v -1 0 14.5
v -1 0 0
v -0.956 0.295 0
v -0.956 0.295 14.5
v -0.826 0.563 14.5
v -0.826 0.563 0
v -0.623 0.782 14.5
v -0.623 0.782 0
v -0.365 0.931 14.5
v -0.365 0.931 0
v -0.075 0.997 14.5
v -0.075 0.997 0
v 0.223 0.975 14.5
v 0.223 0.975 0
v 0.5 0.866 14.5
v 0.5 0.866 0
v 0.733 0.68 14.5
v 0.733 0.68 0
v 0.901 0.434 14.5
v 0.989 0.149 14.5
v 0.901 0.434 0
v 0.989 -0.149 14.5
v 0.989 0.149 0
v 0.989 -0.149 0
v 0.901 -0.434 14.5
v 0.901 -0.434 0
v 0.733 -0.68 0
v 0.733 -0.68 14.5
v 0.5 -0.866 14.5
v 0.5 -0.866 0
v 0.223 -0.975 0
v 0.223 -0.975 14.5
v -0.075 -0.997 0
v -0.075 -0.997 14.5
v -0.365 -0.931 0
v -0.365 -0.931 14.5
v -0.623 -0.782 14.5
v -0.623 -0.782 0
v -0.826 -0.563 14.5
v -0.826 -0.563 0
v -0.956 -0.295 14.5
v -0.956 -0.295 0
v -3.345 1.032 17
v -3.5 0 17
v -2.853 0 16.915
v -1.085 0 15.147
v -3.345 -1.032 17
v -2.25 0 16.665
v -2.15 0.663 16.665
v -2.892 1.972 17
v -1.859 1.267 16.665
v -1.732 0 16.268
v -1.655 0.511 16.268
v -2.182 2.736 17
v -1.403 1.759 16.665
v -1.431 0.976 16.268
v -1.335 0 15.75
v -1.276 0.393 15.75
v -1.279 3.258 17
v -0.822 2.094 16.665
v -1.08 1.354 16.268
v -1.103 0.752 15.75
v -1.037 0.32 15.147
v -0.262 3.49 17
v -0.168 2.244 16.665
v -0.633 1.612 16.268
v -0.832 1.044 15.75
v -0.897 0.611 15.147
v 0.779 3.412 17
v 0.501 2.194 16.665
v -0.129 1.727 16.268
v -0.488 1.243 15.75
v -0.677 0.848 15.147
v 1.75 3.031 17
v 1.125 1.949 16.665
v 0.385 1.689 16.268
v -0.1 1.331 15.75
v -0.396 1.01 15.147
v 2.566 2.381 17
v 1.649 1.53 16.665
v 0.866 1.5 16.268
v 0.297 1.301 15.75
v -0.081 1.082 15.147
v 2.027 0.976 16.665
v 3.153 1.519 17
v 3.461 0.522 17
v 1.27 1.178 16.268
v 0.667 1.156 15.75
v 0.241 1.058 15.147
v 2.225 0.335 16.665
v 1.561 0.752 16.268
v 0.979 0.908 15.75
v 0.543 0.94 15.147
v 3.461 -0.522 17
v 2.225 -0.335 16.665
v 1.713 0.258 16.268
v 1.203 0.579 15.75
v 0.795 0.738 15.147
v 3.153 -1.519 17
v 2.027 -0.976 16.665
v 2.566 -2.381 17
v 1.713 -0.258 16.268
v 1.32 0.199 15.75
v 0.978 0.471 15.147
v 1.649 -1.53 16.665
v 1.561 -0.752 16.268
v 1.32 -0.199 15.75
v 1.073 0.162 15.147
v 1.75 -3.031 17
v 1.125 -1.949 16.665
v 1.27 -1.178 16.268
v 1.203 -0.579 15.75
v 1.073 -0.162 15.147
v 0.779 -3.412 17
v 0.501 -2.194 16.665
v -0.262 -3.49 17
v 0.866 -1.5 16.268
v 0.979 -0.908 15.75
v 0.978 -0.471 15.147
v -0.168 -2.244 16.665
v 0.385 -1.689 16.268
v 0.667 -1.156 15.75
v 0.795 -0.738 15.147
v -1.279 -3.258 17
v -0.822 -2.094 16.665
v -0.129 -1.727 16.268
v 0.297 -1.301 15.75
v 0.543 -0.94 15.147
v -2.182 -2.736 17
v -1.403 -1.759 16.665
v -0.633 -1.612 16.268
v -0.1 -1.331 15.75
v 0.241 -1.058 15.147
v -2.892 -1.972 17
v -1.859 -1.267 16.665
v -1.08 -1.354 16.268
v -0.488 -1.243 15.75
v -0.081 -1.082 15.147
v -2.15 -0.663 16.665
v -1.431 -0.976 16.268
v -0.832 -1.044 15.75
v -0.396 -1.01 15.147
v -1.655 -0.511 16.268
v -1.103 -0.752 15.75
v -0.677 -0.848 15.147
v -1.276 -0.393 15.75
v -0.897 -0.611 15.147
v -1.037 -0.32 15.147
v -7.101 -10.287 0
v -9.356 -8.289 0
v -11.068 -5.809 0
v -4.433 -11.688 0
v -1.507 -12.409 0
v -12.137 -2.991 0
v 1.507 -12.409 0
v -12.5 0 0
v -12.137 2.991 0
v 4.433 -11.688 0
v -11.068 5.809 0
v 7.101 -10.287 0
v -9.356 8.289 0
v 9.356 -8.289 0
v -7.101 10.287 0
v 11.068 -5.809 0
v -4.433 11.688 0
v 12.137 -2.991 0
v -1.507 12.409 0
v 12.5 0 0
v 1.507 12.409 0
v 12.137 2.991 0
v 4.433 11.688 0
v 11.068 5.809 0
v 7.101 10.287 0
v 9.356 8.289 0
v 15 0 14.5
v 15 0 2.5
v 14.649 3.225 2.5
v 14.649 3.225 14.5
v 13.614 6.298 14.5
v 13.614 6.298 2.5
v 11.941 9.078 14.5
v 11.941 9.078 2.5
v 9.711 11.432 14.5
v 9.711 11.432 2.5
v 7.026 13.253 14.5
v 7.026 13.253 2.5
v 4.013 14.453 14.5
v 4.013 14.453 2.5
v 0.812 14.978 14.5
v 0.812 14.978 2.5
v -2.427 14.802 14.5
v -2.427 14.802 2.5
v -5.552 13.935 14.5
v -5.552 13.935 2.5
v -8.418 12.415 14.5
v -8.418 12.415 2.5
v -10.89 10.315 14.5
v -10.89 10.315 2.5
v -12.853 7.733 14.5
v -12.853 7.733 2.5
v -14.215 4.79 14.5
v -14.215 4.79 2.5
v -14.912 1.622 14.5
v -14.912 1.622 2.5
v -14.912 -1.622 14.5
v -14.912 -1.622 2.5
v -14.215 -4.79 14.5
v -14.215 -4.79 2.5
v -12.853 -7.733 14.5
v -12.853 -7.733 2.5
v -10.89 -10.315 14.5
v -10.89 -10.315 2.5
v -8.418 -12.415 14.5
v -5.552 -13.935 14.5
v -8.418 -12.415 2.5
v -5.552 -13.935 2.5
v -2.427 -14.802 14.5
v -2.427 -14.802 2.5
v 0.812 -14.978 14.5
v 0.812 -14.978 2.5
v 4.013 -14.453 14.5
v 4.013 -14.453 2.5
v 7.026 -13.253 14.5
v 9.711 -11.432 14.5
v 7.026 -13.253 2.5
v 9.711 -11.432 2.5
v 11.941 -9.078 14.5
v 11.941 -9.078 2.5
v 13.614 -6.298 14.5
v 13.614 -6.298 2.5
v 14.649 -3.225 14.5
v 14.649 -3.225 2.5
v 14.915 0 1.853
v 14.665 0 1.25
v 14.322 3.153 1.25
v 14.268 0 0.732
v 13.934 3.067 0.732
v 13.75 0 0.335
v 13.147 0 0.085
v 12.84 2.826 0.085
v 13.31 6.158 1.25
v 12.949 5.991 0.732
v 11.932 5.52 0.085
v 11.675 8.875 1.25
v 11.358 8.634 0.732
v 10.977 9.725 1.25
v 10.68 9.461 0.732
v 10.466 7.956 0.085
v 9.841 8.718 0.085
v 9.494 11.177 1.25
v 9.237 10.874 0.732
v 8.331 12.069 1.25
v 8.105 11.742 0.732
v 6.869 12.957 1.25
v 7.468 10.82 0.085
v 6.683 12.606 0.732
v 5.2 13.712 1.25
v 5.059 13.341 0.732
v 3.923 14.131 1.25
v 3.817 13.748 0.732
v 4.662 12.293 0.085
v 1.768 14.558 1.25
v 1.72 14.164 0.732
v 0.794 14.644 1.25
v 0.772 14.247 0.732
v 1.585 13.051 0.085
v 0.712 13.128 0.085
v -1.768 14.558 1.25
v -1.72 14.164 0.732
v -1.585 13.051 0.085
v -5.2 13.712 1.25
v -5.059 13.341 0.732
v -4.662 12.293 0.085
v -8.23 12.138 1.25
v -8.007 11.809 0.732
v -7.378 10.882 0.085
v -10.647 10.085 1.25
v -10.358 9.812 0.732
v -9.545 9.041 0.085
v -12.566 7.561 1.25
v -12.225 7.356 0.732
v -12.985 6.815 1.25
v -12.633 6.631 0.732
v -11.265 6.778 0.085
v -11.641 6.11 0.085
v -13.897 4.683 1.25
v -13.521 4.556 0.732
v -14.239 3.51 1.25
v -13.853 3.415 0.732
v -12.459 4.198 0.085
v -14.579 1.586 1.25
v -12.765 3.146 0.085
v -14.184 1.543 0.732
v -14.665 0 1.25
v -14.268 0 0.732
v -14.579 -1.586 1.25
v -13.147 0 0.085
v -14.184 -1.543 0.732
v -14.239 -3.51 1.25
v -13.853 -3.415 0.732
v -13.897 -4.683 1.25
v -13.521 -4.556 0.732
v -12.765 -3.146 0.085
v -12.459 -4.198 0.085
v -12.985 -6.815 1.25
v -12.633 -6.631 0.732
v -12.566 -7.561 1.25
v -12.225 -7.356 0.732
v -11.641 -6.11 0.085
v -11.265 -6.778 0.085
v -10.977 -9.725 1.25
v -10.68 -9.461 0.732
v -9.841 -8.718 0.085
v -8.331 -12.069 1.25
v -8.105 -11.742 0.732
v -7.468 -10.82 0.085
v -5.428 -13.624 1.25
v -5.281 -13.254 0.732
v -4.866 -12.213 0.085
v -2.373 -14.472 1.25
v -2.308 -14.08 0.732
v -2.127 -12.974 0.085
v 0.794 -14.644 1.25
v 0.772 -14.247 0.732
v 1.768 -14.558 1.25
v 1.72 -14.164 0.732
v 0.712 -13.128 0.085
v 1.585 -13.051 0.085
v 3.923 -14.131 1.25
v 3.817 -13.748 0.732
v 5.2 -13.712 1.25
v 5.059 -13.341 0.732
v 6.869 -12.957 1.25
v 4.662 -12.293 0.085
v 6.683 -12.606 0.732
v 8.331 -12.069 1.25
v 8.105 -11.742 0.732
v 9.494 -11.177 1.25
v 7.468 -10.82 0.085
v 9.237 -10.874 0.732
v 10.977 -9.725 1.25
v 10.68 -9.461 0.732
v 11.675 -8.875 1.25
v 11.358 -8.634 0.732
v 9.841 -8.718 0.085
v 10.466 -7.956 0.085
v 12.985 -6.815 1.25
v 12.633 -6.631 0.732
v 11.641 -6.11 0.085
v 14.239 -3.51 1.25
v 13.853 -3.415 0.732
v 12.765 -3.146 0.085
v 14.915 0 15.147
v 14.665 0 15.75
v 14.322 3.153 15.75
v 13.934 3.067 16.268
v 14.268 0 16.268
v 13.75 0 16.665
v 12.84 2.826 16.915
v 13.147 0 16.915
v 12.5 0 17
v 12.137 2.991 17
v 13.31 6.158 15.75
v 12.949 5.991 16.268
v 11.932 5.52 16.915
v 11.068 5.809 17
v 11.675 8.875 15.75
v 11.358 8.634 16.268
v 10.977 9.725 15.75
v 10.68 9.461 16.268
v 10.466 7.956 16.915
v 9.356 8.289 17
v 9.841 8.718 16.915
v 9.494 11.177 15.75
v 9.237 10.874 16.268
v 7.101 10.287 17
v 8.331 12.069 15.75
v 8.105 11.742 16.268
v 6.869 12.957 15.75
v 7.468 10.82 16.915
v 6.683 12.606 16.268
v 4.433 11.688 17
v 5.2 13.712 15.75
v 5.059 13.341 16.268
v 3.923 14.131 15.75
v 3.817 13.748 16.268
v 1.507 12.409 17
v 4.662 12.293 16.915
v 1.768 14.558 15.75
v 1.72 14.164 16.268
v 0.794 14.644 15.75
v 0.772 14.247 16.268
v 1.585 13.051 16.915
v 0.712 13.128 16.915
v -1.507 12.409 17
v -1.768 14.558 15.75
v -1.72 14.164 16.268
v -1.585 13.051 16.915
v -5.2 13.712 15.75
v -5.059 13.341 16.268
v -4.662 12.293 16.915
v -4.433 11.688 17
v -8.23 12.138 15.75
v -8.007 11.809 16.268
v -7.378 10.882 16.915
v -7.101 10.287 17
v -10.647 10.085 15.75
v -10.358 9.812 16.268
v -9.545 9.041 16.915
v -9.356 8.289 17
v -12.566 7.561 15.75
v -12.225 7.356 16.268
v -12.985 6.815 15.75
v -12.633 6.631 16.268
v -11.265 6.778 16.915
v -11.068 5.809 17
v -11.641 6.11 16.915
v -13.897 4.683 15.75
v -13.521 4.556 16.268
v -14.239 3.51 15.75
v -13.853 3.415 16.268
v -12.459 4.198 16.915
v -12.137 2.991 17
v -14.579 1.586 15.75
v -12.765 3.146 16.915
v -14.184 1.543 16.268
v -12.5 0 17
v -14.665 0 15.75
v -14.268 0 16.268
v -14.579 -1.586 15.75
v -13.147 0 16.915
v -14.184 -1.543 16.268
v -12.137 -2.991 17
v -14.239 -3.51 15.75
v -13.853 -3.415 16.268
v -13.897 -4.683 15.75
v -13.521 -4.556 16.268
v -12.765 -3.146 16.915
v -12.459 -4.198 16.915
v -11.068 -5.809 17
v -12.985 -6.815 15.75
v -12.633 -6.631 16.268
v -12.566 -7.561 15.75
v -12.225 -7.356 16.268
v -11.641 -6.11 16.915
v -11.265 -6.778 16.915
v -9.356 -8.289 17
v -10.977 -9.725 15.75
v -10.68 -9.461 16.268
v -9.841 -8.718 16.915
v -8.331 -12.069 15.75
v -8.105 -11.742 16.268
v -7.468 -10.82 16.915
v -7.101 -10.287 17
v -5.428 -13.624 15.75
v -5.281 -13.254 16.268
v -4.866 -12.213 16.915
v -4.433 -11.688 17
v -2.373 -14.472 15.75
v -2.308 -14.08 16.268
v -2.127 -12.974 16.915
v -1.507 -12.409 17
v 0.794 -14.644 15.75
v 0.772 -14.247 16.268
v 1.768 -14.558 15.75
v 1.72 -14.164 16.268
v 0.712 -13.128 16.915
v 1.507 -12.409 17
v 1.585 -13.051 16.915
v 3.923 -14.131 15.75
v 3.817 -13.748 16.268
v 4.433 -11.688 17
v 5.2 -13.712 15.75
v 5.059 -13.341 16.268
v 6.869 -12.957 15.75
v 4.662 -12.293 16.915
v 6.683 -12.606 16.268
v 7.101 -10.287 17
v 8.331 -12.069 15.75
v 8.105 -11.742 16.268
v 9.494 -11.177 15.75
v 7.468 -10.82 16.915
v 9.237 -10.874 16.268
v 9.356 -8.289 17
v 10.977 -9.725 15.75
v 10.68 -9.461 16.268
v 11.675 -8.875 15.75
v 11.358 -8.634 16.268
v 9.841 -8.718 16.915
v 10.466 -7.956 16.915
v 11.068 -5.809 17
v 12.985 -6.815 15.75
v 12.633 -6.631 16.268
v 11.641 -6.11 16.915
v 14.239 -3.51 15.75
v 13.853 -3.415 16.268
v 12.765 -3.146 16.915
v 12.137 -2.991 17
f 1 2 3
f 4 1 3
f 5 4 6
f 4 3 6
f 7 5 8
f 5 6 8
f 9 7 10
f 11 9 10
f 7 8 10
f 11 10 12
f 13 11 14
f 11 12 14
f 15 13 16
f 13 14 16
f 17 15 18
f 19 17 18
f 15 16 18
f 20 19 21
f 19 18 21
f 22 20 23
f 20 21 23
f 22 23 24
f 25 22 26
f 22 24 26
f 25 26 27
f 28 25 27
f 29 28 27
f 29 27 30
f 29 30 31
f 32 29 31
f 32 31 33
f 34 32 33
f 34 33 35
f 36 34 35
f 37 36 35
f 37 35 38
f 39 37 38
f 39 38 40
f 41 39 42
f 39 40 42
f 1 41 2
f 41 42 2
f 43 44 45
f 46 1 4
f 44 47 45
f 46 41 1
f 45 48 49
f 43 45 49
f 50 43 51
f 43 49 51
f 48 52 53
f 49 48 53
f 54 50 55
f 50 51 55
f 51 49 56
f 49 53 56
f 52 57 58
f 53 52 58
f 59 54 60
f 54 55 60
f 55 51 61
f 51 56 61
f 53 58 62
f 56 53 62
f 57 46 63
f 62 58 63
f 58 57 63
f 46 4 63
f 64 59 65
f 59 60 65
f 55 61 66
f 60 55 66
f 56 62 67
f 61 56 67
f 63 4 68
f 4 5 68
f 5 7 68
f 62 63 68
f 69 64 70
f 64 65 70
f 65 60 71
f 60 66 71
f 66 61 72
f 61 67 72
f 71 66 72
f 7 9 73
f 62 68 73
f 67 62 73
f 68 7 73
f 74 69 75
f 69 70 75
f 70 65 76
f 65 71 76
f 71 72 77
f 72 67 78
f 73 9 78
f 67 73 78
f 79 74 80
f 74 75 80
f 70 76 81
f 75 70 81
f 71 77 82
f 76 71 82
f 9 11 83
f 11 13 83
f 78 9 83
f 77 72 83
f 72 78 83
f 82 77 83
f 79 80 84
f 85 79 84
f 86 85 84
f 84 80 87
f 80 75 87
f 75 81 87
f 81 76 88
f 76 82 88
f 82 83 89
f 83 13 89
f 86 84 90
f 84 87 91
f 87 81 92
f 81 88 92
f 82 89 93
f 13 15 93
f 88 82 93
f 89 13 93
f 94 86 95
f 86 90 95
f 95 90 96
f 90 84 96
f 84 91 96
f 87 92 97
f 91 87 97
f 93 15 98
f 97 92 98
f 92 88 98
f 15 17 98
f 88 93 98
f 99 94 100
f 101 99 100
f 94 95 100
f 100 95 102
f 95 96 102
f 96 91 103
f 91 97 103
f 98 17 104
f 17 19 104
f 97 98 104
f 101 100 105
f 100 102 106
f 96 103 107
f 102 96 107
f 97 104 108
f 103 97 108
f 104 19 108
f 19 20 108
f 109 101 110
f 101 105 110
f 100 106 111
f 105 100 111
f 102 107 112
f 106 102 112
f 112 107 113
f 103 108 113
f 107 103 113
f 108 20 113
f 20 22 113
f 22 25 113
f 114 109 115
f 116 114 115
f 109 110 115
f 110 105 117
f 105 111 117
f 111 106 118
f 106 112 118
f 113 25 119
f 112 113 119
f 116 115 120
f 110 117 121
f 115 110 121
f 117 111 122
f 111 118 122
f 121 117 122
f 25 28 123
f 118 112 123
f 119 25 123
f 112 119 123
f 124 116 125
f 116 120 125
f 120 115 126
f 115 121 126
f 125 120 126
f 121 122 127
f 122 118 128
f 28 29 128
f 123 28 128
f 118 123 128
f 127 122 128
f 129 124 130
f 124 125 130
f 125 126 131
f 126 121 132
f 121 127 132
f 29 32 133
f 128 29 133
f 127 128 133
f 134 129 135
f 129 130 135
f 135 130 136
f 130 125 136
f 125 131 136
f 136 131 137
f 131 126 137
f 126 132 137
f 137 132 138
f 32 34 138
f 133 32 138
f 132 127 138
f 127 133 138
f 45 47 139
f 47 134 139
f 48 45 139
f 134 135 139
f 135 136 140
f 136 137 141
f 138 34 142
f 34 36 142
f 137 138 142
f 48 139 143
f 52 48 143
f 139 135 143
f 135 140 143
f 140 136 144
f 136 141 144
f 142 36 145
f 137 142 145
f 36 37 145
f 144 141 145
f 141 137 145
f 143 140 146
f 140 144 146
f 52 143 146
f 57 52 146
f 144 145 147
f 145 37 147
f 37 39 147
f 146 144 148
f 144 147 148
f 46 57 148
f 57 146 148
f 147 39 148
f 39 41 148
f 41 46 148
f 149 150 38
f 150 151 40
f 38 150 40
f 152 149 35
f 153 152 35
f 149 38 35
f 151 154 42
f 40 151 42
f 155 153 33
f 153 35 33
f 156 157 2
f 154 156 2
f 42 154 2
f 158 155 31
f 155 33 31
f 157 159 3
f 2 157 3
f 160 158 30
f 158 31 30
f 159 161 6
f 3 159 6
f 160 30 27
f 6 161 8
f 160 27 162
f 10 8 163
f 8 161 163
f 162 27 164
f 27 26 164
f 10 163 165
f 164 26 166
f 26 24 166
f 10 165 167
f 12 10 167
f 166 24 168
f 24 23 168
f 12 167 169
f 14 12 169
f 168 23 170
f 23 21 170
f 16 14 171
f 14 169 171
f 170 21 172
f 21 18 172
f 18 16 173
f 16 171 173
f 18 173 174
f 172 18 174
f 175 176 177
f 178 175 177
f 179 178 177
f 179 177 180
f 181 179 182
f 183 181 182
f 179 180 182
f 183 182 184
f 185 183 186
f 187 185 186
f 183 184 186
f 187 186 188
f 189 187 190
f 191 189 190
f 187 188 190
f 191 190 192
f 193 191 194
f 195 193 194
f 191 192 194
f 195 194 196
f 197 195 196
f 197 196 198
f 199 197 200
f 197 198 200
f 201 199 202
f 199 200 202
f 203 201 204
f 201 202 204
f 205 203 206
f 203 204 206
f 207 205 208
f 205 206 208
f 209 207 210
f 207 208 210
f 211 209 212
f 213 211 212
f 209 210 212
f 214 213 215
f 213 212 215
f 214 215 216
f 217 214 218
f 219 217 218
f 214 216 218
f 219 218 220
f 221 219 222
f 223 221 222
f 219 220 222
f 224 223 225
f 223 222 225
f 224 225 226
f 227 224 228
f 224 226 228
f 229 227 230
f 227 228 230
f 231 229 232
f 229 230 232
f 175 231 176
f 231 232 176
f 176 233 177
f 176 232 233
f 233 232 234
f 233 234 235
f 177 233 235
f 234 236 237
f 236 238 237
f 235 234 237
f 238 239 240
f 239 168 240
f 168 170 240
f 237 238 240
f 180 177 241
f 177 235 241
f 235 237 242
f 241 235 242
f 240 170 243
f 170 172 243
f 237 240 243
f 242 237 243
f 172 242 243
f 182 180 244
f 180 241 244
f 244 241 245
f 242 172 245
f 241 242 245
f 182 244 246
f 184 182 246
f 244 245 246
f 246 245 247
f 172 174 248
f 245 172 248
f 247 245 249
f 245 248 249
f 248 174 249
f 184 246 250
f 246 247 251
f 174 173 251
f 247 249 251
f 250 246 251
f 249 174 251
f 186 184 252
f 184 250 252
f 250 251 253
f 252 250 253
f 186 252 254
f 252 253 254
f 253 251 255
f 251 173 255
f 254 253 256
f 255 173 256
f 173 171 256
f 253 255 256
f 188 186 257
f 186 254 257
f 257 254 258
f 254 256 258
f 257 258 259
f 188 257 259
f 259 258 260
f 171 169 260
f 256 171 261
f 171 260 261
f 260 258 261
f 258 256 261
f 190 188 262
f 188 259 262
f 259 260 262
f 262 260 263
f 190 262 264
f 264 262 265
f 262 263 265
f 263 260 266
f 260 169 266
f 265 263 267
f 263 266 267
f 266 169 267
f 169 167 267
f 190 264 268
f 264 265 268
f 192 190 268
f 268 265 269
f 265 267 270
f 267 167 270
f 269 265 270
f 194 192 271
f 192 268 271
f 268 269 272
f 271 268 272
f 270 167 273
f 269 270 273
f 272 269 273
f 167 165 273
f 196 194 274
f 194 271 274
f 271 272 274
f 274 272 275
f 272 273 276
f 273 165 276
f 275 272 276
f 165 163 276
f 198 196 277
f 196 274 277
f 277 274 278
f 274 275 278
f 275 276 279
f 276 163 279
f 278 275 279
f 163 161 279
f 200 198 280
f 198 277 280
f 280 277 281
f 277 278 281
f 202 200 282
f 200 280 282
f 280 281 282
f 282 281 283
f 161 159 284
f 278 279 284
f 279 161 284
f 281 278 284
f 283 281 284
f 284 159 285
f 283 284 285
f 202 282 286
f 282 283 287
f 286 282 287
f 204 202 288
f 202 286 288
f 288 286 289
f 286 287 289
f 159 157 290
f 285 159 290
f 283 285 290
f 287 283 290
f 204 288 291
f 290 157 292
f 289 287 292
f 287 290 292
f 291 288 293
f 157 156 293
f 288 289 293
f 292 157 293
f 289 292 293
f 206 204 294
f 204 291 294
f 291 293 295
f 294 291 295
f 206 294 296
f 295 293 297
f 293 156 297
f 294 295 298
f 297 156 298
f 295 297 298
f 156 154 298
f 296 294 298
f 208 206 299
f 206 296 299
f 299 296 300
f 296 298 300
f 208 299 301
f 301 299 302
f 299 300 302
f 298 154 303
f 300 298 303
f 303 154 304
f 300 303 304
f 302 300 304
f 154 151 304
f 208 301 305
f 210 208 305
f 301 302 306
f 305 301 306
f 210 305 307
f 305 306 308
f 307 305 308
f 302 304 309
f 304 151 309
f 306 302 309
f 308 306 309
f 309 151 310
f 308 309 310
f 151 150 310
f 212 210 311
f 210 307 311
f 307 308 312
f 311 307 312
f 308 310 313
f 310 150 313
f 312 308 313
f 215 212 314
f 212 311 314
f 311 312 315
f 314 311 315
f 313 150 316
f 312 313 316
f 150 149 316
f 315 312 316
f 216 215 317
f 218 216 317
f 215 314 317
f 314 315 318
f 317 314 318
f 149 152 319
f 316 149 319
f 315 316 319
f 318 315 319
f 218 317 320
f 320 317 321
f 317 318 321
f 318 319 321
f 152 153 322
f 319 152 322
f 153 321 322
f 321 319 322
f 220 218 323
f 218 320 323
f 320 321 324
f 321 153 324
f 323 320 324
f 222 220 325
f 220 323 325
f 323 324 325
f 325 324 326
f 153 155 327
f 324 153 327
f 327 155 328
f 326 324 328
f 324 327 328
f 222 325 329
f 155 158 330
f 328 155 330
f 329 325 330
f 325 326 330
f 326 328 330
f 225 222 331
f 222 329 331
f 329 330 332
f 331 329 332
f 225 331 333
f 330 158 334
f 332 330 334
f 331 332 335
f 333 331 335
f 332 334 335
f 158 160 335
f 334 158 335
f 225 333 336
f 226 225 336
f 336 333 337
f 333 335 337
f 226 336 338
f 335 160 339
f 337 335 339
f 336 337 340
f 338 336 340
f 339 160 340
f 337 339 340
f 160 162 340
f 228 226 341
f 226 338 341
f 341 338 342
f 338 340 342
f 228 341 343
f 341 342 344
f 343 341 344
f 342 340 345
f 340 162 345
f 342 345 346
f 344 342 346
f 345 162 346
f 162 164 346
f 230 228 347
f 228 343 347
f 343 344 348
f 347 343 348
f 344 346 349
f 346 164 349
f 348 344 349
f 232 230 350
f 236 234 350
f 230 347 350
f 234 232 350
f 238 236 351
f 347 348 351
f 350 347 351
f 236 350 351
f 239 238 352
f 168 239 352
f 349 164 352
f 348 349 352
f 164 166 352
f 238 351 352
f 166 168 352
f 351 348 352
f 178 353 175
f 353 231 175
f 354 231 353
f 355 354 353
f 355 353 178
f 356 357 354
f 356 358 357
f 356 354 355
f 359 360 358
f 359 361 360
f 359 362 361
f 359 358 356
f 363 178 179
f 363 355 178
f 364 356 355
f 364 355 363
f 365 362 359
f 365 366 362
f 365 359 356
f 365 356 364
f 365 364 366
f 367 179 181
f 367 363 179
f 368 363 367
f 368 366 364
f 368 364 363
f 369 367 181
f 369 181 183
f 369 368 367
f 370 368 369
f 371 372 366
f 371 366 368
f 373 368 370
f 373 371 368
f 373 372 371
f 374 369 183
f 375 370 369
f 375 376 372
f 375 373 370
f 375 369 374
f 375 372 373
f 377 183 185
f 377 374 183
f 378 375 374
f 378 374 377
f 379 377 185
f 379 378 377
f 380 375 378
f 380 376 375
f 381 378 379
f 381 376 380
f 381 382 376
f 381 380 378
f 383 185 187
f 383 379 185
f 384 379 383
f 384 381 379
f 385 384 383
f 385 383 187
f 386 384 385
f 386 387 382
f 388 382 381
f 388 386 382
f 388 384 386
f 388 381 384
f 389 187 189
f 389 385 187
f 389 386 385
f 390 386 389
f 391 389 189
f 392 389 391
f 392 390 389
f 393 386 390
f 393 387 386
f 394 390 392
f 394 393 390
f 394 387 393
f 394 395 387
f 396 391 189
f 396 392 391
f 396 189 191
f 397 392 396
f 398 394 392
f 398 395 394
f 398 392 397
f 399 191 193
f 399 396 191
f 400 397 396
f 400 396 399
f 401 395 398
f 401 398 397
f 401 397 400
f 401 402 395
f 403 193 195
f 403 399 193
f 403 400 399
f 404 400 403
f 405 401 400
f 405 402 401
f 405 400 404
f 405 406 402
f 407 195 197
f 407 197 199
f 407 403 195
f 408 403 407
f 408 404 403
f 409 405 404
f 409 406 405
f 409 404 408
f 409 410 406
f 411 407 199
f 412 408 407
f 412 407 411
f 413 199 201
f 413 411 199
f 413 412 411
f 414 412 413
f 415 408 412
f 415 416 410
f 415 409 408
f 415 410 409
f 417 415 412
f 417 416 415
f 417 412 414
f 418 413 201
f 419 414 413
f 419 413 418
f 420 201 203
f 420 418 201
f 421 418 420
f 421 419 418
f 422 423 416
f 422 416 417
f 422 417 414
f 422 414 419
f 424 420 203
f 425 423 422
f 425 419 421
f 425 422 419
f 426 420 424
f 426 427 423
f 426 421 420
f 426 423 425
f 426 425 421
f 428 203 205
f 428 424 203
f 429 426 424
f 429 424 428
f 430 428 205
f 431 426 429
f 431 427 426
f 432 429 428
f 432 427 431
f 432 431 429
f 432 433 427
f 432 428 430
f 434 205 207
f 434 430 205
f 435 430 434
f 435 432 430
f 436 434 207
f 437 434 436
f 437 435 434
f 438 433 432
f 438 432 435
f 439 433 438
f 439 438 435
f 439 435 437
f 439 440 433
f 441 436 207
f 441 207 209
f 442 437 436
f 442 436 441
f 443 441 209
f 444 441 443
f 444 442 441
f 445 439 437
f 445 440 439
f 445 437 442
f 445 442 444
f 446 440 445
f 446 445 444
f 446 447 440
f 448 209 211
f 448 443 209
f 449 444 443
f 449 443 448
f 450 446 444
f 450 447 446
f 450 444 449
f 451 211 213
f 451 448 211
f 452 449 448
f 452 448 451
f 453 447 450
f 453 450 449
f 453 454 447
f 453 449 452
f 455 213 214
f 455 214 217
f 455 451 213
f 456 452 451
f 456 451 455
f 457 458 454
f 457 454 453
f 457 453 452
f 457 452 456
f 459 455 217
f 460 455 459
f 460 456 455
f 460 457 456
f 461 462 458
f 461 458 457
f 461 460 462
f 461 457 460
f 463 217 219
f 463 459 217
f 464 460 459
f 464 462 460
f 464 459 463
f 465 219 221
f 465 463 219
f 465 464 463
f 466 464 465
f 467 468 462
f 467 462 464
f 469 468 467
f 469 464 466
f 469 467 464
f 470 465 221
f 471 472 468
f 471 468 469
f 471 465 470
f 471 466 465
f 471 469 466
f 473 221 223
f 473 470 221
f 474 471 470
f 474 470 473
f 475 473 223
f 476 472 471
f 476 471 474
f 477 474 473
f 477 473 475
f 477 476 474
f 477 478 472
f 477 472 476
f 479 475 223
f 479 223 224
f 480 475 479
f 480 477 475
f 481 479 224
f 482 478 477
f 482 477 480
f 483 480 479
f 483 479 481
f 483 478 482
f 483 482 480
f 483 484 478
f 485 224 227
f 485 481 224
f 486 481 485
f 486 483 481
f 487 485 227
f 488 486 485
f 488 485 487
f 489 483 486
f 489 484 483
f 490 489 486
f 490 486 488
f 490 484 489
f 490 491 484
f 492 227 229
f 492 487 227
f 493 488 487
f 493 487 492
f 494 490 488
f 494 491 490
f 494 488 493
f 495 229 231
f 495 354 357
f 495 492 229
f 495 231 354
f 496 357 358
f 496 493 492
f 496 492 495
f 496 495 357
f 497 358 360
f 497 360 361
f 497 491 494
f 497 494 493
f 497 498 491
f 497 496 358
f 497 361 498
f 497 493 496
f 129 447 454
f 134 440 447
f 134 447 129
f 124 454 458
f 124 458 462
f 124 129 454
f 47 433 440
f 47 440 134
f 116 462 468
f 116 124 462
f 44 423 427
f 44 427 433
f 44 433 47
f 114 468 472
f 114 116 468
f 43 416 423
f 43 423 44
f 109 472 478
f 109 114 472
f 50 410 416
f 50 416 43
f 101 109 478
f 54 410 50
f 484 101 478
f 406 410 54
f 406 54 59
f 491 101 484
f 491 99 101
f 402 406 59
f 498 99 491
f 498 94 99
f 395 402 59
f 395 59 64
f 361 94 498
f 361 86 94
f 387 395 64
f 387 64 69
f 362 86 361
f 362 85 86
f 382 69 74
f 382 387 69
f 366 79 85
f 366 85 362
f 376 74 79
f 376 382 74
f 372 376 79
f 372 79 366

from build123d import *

# Parameters (mm, degrees)
SKETCH1_R           = 15
BOSS_EXTRUDE1_DEPTH = 17
SKETCH2_R           = 1
CUT_EXTRUDE1_DEPTH  = 17
FILLET3_R           = 2.5


with BuildPart() as part:
    # Sketch1 → Boss-Extrude1 (new body)
    with BuildSketch(Plane.XY):
        Circle(SKETCH1_R)
    extrude(amount=BOSS_EXTRUDE1_DEPTH)

    # Sketch2 → Cut-Extrude1 (cut)
    with BuildSketch(Plane(origin=(0, 0, 0), x_dir=(-1, 0, 0), z_dir=(0, 0, -1))):
        Circle(SKETCH2_R)
    extrude(amount=-CUT_EXTRUDE1_DEPTH, mode=Mode.SUBTRACT)

    # Fillet3
    fillet3_edges = [part.edges().sort_by_distance(p)[0] for p in [
        (-15, 0, 0),
        (-15, 0, 17),
        (1, 0, 17),
    ]]
    fillet(fillet3_edges, radius=FILLET3_R)


solid = part.part
